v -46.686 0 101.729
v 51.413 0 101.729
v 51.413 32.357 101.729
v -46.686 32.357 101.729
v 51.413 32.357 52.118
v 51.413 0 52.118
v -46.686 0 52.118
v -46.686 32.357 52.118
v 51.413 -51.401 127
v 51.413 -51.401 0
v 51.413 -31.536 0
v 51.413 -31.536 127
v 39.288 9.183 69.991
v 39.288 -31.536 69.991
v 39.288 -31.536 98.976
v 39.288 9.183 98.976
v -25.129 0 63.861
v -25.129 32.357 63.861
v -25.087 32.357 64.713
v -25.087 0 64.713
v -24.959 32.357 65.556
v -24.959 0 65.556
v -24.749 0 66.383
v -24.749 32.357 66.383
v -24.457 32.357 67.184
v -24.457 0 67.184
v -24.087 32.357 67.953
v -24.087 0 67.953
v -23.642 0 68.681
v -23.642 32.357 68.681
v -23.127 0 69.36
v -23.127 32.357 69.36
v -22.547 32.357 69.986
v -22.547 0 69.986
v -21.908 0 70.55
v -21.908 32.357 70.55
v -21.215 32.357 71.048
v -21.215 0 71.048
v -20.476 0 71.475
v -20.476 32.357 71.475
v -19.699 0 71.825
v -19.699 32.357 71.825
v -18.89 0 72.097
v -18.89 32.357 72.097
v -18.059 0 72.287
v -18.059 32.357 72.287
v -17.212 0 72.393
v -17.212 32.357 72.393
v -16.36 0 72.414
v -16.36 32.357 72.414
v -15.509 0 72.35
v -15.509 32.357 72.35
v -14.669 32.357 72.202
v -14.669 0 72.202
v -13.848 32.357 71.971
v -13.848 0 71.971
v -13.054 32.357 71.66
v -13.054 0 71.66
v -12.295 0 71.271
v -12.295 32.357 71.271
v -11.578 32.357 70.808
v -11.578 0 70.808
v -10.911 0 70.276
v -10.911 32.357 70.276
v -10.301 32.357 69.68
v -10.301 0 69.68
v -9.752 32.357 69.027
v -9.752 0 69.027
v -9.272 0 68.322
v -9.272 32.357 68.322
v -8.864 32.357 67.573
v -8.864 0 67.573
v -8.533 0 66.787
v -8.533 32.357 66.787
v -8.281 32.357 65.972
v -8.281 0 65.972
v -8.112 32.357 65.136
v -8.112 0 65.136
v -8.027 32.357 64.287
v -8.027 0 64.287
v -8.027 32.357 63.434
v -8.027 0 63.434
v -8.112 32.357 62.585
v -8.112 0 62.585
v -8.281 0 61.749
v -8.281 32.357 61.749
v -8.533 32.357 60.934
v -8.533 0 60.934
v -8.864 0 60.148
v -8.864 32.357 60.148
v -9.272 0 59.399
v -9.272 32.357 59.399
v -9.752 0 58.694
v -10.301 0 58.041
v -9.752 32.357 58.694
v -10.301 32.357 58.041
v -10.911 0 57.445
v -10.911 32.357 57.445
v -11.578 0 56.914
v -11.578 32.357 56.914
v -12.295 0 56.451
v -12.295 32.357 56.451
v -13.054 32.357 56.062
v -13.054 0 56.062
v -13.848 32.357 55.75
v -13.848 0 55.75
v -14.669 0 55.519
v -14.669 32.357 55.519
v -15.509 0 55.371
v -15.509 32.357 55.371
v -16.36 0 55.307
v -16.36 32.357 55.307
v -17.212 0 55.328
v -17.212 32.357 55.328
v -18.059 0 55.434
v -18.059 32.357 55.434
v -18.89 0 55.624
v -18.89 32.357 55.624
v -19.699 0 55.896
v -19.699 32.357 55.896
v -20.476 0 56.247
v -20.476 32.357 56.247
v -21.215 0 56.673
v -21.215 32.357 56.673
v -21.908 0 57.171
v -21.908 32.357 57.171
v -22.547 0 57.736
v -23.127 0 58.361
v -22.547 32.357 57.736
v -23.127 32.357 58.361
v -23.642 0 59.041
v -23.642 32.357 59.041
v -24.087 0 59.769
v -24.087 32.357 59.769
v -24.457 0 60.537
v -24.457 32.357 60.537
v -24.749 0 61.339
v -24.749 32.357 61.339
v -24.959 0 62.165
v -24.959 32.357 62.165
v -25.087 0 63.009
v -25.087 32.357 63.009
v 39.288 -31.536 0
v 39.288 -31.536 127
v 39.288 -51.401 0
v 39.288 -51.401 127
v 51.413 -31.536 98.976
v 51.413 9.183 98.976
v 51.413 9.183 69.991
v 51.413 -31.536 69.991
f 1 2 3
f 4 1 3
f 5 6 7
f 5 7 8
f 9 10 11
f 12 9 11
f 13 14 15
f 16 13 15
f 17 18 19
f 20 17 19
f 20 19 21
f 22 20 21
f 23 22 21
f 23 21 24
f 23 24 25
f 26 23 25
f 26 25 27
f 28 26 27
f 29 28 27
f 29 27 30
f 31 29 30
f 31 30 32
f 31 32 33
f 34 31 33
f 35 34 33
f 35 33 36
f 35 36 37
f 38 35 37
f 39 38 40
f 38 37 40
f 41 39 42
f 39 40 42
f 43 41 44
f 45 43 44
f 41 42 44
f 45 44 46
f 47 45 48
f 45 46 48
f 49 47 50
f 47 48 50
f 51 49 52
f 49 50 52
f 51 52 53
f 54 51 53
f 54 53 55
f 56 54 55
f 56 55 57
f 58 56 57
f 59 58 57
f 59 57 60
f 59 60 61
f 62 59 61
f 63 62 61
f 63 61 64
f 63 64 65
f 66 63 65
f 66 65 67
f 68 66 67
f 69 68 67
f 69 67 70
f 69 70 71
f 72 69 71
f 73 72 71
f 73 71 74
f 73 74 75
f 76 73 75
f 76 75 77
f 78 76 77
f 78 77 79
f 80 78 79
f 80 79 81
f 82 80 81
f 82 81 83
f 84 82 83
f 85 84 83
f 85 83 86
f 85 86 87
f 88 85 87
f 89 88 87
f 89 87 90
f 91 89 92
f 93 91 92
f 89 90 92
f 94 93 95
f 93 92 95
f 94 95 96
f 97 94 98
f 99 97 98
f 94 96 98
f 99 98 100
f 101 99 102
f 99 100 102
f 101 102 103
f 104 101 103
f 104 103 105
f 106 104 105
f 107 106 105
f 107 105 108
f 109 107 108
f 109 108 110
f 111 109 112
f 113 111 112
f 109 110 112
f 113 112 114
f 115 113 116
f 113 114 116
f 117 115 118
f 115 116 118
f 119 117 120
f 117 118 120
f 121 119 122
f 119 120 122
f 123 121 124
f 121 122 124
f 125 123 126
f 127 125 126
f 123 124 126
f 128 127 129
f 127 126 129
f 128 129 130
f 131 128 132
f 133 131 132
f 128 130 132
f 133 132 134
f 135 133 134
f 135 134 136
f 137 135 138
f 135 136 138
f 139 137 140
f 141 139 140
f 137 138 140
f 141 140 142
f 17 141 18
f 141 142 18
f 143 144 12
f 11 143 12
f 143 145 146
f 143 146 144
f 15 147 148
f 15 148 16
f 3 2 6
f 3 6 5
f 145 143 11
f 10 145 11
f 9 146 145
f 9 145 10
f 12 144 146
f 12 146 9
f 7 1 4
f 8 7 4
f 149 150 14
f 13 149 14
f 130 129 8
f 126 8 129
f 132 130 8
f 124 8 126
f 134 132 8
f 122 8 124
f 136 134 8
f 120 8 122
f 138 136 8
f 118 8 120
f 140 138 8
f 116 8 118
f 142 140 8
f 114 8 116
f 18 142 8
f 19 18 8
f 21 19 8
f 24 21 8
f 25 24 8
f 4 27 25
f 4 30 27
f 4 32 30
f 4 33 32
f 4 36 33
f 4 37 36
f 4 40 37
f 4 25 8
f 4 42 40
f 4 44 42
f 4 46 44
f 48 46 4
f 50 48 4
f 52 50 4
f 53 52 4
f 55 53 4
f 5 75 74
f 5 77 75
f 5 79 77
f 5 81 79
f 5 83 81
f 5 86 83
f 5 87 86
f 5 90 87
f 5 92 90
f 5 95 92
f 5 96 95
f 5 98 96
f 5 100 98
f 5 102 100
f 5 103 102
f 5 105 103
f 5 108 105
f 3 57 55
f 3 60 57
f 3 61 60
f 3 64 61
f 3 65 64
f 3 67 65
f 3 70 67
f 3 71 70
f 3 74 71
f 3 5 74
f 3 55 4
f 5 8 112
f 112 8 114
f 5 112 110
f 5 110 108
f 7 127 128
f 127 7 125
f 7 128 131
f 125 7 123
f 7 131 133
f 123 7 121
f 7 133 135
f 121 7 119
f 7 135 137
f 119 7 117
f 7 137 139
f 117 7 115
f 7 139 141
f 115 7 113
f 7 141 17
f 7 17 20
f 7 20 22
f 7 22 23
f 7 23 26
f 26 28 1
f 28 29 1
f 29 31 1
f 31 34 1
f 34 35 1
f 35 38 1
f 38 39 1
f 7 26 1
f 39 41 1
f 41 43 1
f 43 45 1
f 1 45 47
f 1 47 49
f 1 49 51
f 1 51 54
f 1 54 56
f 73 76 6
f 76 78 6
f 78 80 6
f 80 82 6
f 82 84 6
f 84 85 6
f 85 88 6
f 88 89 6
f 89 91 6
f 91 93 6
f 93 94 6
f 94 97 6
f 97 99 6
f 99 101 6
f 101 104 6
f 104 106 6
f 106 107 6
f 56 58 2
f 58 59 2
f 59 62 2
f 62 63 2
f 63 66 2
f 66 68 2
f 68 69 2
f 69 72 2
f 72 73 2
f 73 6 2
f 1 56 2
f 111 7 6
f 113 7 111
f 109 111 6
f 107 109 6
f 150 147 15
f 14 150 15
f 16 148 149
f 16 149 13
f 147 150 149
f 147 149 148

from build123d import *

# Parameters (mm, degrees)
F0_W     = 12.1247209609
F0_H     = 19.86515522
F2_DEPTH = 127
F3_W     = 32.3565304279
F3_H     = 49.6104732156
F4_DEPTH = 98.0996470898
F6_W     = 12.1247209609
F6_H     = 28.984606266
F7_DEPTH = 40.7187305391
F8_R     = 8.5562099795
F9_DEPTH = 81.7973520607


# Not quite as in the source:
# - a feature of the source that left no trace in its solid (it failed there, or was rolled back) is left out


with BuildPart() as f2:
    # F0 (on Top) → F2 (new body)
    with BuildSketch(Plane.XY):
        with Locations((45.3508067876, -41.4686575532)):
            Rectangle(F0_W, F0_H)
    extrude(amount=F2_DEPTH)


with BuildPart() as f4:
    # F3 (on face) → F4 (new body)
    with BuildSketch(Plane.YZ.offset(51.413167268)):
        with Locations((16.178265214, 76.9235752523)):
            Rectangle(F3_W, F3_H)
    extrude(amount=-F4_DEPTH)

    # F8 (on face) → F9 (cut)
    with BuildSketch(Plane(origin=(0, 32.3565304279, 0), x_dir=(-1, 0, 0), z_dir=(0, 1, 0))):
        with Locations((16.5728703141, 63.8606324792)):
            Circle(F8_R)
    extrude(amount=-F9_DEPTH, mode=Mode.SUBTRACT)


with BuildPart() as f7:
    # F6 (on face) → F7 (new body)
    with BuildSketch(Plane(origin=(0, -31.5360799432, 0), x_dir=(-1, 0, 0), z_dir=(0, 1, 0))):
        with Locations((-45.3508067876, 84.4837799668)):
            Rectangle(F6_W, F6_H)
    extrude(amount=F7_DEPTH)


solid = Compound([f2.part, f4.part, f7.part])
